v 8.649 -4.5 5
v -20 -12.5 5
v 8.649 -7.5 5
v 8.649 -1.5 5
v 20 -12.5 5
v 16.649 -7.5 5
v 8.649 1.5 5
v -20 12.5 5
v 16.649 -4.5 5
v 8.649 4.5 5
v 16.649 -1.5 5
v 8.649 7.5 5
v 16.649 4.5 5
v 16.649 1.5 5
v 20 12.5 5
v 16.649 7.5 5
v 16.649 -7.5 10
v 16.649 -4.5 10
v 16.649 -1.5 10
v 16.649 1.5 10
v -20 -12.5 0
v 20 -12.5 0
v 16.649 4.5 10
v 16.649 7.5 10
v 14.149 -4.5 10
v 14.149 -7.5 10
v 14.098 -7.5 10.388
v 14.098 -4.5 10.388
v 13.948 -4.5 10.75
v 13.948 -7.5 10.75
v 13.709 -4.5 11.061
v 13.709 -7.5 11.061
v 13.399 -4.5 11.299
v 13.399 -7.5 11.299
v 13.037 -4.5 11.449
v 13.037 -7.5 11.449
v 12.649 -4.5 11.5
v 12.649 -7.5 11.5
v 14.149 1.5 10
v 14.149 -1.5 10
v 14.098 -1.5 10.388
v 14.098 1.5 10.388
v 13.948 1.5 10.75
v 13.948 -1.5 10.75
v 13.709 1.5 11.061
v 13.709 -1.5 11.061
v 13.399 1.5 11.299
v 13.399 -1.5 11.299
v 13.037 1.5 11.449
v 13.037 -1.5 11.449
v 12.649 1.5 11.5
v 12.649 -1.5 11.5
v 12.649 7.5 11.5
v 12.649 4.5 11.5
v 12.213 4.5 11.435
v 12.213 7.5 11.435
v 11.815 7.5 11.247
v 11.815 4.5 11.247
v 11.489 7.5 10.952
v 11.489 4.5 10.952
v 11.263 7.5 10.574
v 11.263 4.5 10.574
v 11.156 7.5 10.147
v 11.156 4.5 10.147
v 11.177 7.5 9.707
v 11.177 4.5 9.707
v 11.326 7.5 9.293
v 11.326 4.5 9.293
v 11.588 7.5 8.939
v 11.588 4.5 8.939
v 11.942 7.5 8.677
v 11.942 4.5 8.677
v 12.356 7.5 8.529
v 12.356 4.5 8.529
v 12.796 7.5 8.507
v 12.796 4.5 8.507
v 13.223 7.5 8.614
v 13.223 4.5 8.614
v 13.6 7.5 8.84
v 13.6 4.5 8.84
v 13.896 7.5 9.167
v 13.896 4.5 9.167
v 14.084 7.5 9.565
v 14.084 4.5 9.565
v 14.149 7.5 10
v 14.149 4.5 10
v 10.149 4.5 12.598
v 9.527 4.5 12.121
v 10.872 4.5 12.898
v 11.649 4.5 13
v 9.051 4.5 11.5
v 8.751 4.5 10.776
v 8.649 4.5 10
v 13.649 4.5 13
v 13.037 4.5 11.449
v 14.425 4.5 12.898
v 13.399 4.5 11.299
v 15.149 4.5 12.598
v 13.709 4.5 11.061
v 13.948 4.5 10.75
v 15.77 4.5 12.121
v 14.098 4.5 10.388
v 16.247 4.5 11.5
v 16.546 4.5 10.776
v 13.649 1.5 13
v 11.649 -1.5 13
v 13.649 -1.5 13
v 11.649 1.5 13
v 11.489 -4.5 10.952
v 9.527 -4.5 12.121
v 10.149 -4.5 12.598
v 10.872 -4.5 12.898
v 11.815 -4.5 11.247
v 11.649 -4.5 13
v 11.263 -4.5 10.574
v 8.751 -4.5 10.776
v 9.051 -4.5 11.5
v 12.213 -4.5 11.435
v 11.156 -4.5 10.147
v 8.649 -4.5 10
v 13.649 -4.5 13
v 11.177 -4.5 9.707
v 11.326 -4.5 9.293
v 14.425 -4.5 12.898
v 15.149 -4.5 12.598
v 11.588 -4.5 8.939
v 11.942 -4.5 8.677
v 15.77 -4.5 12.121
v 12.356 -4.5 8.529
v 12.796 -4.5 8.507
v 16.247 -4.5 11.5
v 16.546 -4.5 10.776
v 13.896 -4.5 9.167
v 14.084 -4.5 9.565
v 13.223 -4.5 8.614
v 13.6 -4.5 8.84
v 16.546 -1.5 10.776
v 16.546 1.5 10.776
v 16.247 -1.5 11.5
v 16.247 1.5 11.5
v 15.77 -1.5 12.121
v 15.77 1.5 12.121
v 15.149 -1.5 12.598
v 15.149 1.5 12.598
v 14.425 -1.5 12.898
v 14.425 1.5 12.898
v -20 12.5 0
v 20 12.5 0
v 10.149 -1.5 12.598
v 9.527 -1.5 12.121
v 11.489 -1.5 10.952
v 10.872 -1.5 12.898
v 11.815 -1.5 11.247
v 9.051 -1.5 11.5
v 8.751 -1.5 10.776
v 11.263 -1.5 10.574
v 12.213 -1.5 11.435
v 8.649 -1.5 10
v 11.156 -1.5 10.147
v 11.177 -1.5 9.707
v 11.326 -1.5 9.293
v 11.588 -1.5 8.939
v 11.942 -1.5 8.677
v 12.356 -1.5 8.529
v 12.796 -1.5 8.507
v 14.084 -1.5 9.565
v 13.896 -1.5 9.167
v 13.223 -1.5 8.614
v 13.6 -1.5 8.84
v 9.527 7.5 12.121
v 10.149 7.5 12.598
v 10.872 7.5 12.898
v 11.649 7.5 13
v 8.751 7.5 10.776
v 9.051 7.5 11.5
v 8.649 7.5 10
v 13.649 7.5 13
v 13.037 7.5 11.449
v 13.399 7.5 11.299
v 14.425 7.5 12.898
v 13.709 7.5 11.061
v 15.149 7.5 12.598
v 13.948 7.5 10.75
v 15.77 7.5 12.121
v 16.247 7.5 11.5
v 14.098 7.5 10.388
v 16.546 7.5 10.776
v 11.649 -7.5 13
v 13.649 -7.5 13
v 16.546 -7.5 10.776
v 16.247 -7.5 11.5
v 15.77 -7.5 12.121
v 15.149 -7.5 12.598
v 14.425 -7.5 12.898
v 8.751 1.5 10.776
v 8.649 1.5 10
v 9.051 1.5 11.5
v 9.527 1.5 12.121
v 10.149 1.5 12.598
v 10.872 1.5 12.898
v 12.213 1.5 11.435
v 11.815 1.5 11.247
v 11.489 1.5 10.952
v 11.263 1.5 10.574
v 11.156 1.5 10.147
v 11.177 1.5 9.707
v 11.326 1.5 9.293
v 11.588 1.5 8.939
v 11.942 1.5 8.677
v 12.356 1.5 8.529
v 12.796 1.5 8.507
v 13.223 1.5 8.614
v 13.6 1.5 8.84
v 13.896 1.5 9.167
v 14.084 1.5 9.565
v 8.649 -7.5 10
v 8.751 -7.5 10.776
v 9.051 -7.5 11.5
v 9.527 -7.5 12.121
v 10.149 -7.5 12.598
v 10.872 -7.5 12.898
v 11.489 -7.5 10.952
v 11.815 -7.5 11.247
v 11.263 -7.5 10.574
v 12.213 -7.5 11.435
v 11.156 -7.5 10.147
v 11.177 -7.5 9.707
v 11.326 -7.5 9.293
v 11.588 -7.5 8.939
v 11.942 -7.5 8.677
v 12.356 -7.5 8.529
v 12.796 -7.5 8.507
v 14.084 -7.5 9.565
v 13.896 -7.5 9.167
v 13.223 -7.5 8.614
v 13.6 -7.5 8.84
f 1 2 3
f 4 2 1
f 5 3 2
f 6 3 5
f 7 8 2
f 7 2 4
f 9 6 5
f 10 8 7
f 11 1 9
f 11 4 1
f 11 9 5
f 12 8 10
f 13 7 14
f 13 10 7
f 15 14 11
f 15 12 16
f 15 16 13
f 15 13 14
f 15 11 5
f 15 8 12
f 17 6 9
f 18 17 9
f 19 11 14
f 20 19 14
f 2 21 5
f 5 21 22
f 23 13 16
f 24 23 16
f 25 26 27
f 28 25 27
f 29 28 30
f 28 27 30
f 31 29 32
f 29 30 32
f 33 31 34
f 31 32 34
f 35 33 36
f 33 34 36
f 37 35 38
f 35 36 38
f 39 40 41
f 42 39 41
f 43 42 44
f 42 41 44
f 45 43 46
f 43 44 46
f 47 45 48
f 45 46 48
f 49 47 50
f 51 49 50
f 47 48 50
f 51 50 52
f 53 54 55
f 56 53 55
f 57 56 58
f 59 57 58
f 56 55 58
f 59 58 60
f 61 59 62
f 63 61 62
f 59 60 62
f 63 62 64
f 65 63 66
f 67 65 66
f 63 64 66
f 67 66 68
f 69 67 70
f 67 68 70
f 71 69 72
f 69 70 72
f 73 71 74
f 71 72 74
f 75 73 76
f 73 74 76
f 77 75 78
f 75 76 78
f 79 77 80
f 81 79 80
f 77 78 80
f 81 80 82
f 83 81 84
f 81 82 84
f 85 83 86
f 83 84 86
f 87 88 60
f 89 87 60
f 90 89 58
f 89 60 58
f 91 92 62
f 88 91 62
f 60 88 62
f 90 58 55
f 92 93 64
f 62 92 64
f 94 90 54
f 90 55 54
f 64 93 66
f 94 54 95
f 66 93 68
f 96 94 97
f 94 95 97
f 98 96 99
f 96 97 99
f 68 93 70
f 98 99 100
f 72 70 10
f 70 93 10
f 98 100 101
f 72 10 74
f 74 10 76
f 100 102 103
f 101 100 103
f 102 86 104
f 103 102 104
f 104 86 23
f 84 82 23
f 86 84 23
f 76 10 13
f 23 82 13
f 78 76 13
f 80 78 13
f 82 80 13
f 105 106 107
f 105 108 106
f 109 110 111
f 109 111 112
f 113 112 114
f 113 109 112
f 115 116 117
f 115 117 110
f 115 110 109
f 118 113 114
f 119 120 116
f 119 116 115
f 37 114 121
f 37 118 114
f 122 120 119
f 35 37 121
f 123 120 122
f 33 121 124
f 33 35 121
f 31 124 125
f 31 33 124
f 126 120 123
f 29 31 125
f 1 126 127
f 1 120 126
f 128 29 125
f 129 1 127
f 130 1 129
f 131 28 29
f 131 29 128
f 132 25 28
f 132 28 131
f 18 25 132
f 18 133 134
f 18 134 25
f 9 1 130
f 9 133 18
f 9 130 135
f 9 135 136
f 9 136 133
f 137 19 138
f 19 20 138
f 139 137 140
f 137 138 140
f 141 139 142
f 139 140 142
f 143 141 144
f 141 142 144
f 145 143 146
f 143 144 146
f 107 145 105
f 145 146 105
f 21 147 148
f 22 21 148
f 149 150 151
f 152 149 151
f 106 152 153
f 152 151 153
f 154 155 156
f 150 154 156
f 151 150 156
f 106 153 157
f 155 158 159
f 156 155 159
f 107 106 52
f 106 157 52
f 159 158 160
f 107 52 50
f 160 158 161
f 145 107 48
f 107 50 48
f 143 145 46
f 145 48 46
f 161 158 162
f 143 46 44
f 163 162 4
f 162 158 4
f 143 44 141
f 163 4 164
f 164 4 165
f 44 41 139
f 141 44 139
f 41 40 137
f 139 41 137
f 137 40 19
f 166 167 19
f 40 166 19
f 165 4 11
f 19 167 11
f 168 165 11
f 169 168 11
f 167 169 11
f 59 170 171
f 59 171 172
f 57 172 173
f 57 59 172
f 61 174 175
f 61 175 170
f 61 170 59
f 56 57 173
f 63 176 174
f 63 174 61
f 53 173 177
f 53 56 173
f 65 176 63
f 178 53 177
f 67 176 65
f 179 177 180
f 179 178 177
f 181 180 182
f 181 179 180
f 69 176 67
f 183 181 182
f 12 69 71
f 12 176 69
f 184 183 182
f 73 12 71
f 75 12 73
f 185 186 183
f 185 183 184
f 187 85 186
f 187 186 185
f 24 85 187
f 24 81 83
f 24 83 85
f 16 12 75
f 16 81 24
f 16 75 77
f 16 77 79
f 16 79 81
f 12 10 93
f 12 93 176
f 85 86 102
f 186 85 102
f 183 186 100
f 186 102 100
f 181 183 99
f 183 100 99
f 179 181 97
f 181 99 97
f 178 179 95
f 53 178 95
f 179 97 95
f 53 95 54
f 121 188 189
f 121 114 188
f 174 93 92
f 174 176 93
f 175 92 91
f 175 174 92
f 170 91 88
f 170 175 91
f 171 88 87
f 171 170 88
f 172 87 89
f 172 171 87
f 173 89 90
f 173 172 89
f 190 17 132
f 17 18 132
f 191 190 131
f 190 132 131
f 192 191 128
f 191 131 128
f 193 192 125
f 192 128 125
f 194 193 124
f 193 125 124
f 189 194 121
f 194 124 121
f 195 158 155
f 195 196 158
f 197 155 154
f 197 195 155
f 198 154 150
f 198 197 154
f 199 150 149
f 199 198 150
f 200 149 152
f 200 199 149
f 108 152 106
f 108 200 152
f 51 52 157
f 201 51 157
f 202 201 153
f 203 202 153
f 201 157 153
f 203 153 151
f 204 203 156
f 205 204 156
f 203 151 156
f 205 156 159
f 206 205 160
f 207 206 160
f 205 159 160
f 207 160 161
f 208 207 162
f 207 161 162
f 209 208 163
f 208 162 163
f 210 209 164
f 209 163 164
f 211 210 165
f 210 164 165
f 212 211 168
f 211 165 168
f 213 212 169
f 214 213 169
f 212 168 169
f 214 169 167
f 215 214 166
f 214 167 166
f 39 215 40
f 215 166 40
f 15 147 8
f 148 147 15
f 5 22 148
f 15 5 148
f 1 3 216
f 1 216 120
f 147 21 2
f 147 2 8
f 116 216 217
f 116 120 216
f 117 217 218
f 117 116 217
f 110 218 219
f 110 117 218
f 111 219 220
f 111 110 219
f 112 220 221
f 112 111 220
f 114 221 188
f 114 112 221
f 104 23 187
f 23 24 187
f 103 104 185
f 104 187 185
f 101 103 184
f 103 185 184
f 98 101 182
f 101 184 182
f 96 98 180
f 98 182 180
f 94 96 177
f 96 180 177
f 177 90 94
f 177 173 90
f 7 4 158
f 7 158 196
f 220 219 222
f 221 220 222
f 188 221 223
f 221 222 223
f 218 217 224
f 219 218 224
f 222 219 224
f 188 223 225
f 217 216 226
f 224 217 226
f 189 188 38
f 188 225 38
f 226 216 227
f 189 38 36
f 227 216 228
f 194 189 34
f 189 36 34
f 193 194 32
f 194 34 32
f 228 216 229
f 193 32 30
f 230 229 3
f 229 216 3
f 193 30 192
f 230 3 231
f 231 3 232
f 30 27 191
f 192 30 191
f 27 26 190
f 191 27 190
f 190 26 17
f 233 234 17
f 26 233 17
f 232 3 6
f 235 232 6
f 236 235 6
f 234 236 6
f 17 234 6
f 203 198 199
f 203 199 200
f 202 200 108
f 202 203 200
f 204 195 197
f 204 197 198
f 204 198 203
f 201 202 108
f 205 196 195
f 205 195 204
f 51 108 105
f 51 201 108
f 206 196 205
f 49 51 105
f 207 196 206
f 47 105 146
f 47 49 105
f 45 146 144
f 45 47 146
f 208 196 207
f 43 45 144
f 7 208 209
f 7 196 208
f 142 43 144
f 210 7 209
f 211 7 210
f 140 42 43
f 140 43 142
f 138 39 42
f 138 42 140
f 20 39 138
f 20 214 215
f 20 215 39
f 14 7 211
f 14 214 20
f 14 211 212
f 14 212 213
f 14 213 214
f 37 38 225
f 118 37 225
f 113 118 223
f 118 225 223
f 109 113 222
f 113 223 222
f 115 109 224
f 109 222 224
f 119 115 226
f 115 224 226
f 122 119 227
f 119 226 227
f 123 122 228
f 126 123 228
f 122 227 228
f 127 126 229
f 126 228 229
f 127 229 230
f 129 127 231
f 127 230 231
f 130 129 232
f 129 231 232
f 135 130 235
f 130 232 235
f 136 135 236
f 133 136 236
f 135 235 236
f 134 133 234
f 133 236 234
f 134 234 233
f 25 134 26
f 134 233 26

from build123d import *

# Parameters (mm, degrees)
F0_W     = 40
F0_H     = 25
F1_DEPTH = 5
F2_W     = 8
F2_H     = 3
F3_DEPTH = 8
F4_R     = 3
F6_DEPTH = 25


with BuildPart() as f1:
    # F0 (on Top) → F1 (new body)
    with BuildSketch(Plane.XY):
        Rectangle(F0_W, F0_H)
    extrude(amount=F1_DEPTH)

    # F2 (on face) → F3 (join)
    with BuildSketch(Plane.XY.offset(5)):
        with Locations((12.6486493205, 6)):
            Rectangle(F2_W, F2_H)
        with Locations((12.6486493205, 0)):
            Rectangle(F2_W, F2_H)
        with Locations((12.6486493205, -6)):
            Rectangle(F2_W, F2_H)
    extrude(amount=F3_DEPTH)

    # F4
    f4_edges = [f1.edges().sort_by_distance(p)[0] for p in [
        (8.648649, -6, 13),
        (16.648649, -6, 13),
        (8.648649, 0, 13),
        (16.648649, 0, 13),
        (8.648649, 6, 13),
        (16.648649, 6, 13),
    ]]
    fillet(f4_edges, radius=F4_R)

    # F5 (on face) → F6 (cut)
    with BuildSketch(Plane.XZ.offset(7.5)):
        with BuildLine():
            ThreePointArc((14.1486493205, 10), (13.7093094923, 11.0606601718), (12.6486493205, 11.5))
            ThreePointArc((12.6486493205, 11.5), (11.5879891487, 8.9393398282), (14.1486493205, 10))
        make_face()
    extrude(amount=-F6_DEPTH, mode=Mode.SUBTRACT)


solid = f1.part
